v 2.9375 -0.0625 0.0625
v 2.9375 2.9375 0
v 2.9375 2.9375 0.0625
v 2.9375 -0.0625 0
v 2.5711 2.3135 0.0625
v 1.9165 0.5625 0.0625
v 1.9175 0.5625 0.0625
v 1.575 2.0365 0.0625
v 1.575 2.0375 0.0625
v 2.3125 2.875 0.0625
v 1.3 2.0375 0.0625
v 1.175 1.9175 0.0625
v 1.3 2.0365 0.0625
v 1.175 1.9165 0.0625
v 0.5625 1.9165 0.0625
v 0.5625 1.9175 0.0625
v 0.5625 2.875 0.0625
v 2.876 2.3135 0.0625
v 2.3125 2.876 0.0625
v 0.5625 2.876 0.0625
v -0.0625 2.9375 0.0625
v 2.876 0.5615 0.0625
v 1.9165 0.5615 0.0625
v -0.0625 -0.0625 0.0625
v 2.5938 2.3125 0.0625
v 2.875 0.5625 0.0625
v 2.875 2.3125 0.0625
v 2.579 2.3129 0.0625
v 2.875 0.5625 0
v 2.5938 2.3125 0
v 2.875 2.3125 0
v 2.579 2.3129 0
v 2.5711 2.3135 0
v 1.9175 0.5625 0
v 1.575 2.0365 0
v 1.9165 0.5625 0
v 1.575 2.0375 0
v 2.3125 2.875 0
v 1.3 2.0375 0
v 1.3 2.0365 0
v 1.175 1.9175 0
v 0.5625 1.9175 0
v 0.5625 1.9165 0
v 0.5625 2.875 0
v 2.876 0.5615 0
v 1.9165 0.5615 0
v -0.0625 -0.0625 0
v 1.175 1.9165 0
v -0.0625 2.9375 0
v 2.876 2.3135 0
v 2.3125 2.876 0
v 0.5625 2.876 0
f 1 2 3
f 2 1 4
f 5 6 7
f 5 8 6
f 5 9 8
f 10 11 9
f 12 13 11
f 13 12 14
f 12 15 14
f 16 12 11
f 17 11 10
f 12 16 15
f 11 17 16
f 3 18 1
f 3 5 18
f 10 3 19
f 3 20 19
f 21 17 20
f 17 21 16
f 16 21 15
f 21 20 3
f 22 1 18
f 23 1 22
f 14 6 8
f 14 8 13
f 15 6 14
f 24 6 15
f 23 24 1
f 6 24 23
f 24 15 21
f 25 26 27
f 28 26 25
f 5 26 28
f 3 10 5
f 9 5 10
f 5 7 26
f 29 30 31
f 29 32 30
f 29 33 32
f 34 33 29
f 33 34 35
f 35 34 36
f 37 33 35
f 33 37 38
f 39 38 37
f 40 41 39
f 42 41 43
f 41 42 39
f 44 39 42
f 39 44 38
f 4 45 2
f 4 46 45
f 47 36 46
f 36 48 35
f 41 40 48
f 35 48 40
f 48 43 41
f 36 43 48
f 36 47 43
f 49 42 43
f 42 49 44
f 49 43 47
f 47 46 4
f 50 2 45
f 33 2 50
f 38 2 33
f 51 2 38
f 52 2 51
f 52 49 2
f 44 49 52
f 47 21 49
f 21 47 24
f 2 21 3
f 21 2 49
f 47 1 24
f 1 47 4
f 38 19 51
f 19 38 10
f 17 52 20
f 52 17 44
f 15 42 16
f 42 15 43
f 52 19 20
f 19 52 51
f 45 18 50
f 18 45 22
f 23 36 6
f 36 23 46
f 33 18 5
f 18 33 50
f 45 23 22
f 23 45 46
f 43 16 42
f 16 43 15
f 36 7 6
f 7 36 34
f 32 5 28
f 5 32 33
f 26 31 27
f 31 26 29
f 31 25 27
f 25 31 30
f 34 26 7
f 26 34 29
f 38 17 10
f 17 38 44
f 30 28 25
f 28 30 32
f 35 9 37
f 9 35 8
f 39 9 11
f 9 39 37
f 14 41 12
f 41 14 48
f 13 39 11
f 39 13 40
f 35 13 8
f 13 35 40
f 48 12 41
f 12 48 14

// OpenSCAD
// file: modules.scad
// modules.scad — shared tile-building blocks: plate, rivets, edge ID marks,
// and the common plate/hole dimensional constants used by every tile.
// Units: inches
//
// Usage — must be `include`, not `use`, and the include line must come
// before any code in the caller that references plate_w/plate_d/plate_h/
// frame_w/hole_d/hole_r: a variable defined only inside an included file is
// invisible to code positioned before the include statement.
//   include <modules.scad>
//   plate(["red", undef, "blue", undef, undef, "green"]);
//
// plate(colors) is the main entry point: it builds the complete base tile in
// one call — the frame with edge ID marks, the darkgray plate, and the
// lightgray rivet ring (40 rivets, 10 per side, corners shared). colors is the
// same 6-slot frame_with_id() array described below.
//
// frame_with_id() colors are applied left-to-right (−x to +x), repeated
// identically on all four edges. Bottom and right edges read the array in
// reverse (slot 5-i) so the pattern stays consistent when the tile is flipped.
// Any position left as undef or omitted defaults to black. 6 regions span the
// straight run of each edge (corners always stay solid black). A thin black
// layer covers the marks on the top face; marks are visible from the edge.

plate_w = 2 + 7/8;
plate_d = 2 + 7/8;
plate_h = 1/16;
frame_w = 1/16;
hole_d  = 3/32;
hole_r  = hole_d / 2;

module rivet_holes() {
    spacing_x = plate_w / 10;
    spacing_y = plate_d / 10;
    inset_x   = spacing_x / 2;
    inset_y   = spacing_y / 2;
    for (i = [0:9]) translate([inset_x + i * spacing_x, inset_y,           -1]) cylinder(h = plate_h + 2, r = hole_r, $fn = 20);
    for (i = [0:9]) translate([inset_x + i * spacing_x, plate_d - inset_y, -1]) cylinder(h = plate_h + 2, r = hole_r, $fn = 20);
    for (i = [0:9]) translate([inset_x,           inset_y + i * spacing_y, -1]) cylinder(h = plate_h + 2, r = hole_r, $fn = 20);
    for (i = [0:9]) translate([plate_w - inset_x, inset_y + i * spacing_y, -1]) cylinder(h = plate_h + 2, r = hole_r, $fn = 20);
}

module rivets() {
    spacing_x = plate_w / 10;
    spacing_y = plate_d / 10;
    inset_x   = spacing_x / 2;
    inset_y   = spacing_y / 2;
    color("lightgray") {
        for (i = [0:9]) translate([inset_x + i * spacing_x, inset_y,           0]) cylinder(h = plate_h, r = hole_r, $fn = 20);
        for (i = [0:9]) translate([inset_x + i * spacing_x, plate_d - inset_y, 0]) cylinder(h = plate_h, r = hole_r, $fn = 20);
        for (i = [0:9]) translate([inset_x,           inset_y + i * spacing_y, 0]) cylinder(h = plate_h, r = hole_r, $fn = 20);
        for (i = [0:9]) translate([plate_w - inset_x, inset_y + i * spacing_y, 0]) cylinder(h = plate_h, r = hole_r, $fn = 20);
    }
}

module frame_with_id(colors = []) {
    id_cover = plate_h / 8;
    region_w = plate_w / 6;
    region_d = plate_d / 6;
    mark_h   = plate_h - id_cover;

    color("black")
    difference() {
        translate([-frame_w, -frame_w, 0])
            cube([plate_w + 2 * frame_w, plate_d + 2 * frame_w, plate_h]);
        translate([0, 0, -0.001])
            cube([plate_w, plate_d, plate_h + 0.002]);
        // top/bottom/left/right straight runs only — corners stay solid black
        translate([0, plate_d - 0.001, -0.001])
            cube([plate_w, frame_w + 0.002, plate_h + 0.002]);
        translate([0, -frame_w - 0.001, -0.001])
            cube([plate_w, frame_w + 0.002, plate_h + 0.002]);
        translate([-frame_w - 0.001, 0, -0.001])
            cube([frame_w + 0.002, plate_d, plate_h + 0.002]);
        translate([plate_w - 0.001, 0, -0.001])
            cube([frame_w + 0.002, plate_d, plate_h + 0.002]);
    }

    for (i = [0:5]) {
        c     = (colors[i] != undef) ? colors[i] : "black";

        // top edge
        color(c) translate([i * region_w, plate_d, 0]) cube([region_w, frame_w, mark_h]);
        color("black") translate([i * region_w, plate_d, mark_h]) cube([region_w, frame_w, id_cover]);

        // bottom edge (reversed)
        color(c) translate([(5-i) * region_w, -frame_w, 0]) cube([region_w, frame_w, mark_h]);
        color("black") translate([(5-i) * region_w, -frame_w, mark_h]) cube([region_w, frame_w, id_cover]);

        // left edge
        color(c) translate([-frame_w, i * region_d, 0]) cube([frame_w, region_d, mark_h]);
        color("black") translate([-frame_w, i * region_d, mark_h]) cube([frame_w, region_d, id_cover]);

        // right edge (reversed)
        color(c) translate([plate_w, (5-i) * region_d, 0]) cube([frame_w, region_d, mark_h]);
        color("black") translate([plate_w, (5-i) * region_d, mark_h]) cube([frame_w, region_d, id_cover]);
    }
}

module plate(colors = []) {
    frame_with_id(colors);
    union() {
        difference() {
            color("darkgray") cube([plate_w, plate_d, plate_h]);
            rivet_holes();
        }
        rivets();
    }
}
// main file
// element11.scad — right-turn belt tile
// Units: inches

straight   = false;
left_turn  = false;
right_turn = true;

include <modules.scad>

belt_w    = 1.75;
belt_half = belt_w / 2;

roller_count  = 13;
roller_h_size = 3/16;
roller_r      = roller_h_size / 2;
roller_inset  = plate_w / 20;
roller_x_lo   = 2 * roller_inset;
roller_x_hi   = plate_w - 2 * roller_inset;
roller_y_step = (plate_w - 2 * roller_inset) / 12;

b_L = plate_w / 2 - belt_half;
b_R = plate_w / 2 + belt_half;
nub = roller_x_hi - b_R;

arrow_w       = belt_w * 0.75;
arrow_shaft_w = arrow_w * 0.4;
arrow_shaft_h = 1.5;
arrow_head_h  = arrow_w / 2;
arrow_h       = arrow_shaft_h + arrow_head_h;
arrow_tip_y   = 3 * plate_d / 20 + 1/4 + 7 * plate_d / 10;
arrow_y       = arrow_tip_y - arrow_h;
arrow_outline = 1/16;
arrow_fill_w  = 2 * arrow_outline;

cx         = plate_w / 2;
r_curve    = 0.48;
y_merge    = arrow_y + arrow_shaft_h;
y_arc_ctr  = y_merge + 0.12;
y_entry    = y_arc_ctr + r_curve;
cx_l       = cx - r_curve;
cx_r       = cx + r_curve;
r_outer    = r_curve + belt_half;
h_straight = 0.49;

module belt_cutout() {
    // Straight vertical strip (top)
    translate([(plate_w - belt_w) / 2, plate_d/2 + r_curve - 0.001, -0.001])
        cube([belt_w, plate_d/2 - r_curve + 0.002, plate_h + 0.002]);
    // Horizontal entry from right
    translate([cx_r - 0.001, plate_d/2 - belt_half - 0.001, -0.001])
        cube([plate_w - cx_r + 0.002, belt_w + 0.002, plate_h + 0.002]);
    // Arc corner fill: lower-left quadrant at (cx_r, plate_d/2 + r_curve)
    translate([cx_r, plate_d/2 + r_curve, -0.001])
    linear_extrude(plate_h + 0.002)
    intersection() {
        circle(r = r_outer, $fn = 120);
        translate([-r_outer, -r_outer]) square([r_outer, r_outer]);
    }
    // Curved corner — bottom-left of the top-right uncovered square
    translate([b_R, plate_d/2 + belt_half, -0.001])
    linear_extrude(plate_h + 0.002)
    difference() {
        square([b_L/2, b_L/2]);
        translate([b_L/2, b_L/2])
            circle(r = b_L/2, $fn = 120);
    }
}

module roller_slots() {
    // a. Horizontal bars — top-section only, right-clipped; i=12 full-width
    for (i = [0:roller_count - 1]) {
        if (roller_inset + i * roller_y_step >= y_arc_ctr - roller_y_step) {
            translate([0, 0, -0.001])
            hull() {
                translate([roller_x_lo + roller_r,
                           roller_inset + i * roller_y_step, 0])
                    cylinder(h = plate_h + 0.002, r = roller_r, $fn = 20);
                translate([(i == roller_count - 1 ? roller_x_hi : b_R) - roller_r,
                           roller_inset + i * roller_y_step, 0])
                    cylinder(h = plate_h + 0.002, r = roller_r, $fn = 20);
            }
        }
    }
    // b. Vertical entry bars — right side; skip if rx < cx_r
    for (i = [0:roller_count - 1]) {
        if (roller_inset + i * roller_y_step >= cx_r) {
            y_hi = (i == roller_count - 1) ? plate_d - roller_x_lo : plate_d/2 + belt_half;
            translate([0, 0, -0.001])
            hull() {
                translate([roller_inset + i * roller_y_step, roller_x_lo + roller_r, 0])
                    cylinder(h = plate_h + 0.002, r = roller_r, $fn = 20);
                translate([roller_inset + i * roller_y_step, y_hi - roller_r, 0])
                    cylinder(h = plate_h + 0.002, r = roller_r, $fn = 20);
            }
        }
    }
    // c. Arc radial bars — 11 bars, center (cx_r, plate_d/2 + r_curve), 180°–270°
    r_outer_bars = r_outer + nub;
    for (k = [0:10]) {
        theta = 180 + 2.25 + k * (85.5 / 10);
        translate([cx_r, plate_d/2 + r_curve, 0])
        rotate([0, 0, theta])
        translate([0, 0, -0.001])
        hull() {
            translate([r_outer_bars - roller_r, 0, 0])
                cylinder(h = plate_h + 0.002, r = roller_r, $fn = 20);
            translate([r_outer_bars - roller_r - nub, 0, 0])
                cylinder(h = plate_h + 0.002, r = roller_r, $fn = 20);
        }
    }
    // d. Upper diagonal corner — upper-right of belt entry
    translate([b_R, plate_d/2 + belt_half, 0])
    rotate([0, 0, 45])
    translate([0, 0, -0.001])
    hull() {
        cylinder(h = plate_h + 0.002, r = roller_r, $fn = 20);
        translate([nub, 0, 0])
            cylinder(h = plate_h + 0.002, r = roller_r, $fn = 20);
    }
}

module rollers() {
    color("green")
    difference() {
        union() {
            // a. Horizontal bars
            for (i = [0:roller_count - 1]) {
                if (roller_inset + i * roller_y_step >= y_arc_ctr - roller_y_step) {
                    hull() {
                        translate([roller_x_lo + roller_r,
                                   roller_inset + i * roller_y_step, 0])
                            cylinder(h = plate_h, r = roller_r, $fn = 20);
                        translate([(i == roller_count - 1 ? roller_x_hi : b_R) - roller_r,
                                   roller_inset + i * roller_y_step, 0])
                            cylinder(h = plate_h, r = roller_r, $fn = 20);
                    }
                }
            }
            // b. Vertical entry bars
            for (i = [0:roller_count - 1]) {
                if (roller_inset + i * roller_y_step >= cx_r) {
                    y_hi = (i == roller_count - 1) ? plate_d - roller_x_lo : plate_d/2 + belt_half;
                    hull() {
                        translate([roller_inset + i * roller_y_step, roller_x_lo + roller_r, 0])
                            cylinder(h = plate_h, r = roller_r, $fn = 20);
                        translate([roller_inset + i * roller_y_step, y_hi - roller_r, 0])
                            cylinder(h = plate_h, r = roller_r, $fn = 20);
                    }
                }
            }
            // c. Arc radial bars
            r_outer_bars = r_outer + nub;
            for (k = [0:10]) {
                theta = 180 + 2.25 + k * (85.5 / 10);
                translate([cx_r, plate_d/2 + r_curve, 0])
                rotate([0, 0, theta])
                hull() {
                    translate([r_outer_bars - roller_r, 0, 0])
                        cylinder(h = plate_h, r = roller_r, $fn = 20);
                    translate([r_outer_bars - roller_r - nub, 0, 0])
                        cylinder(h = plate_h, r = roller_r, $fn = 20);
                }
            }
            // d. Upper diagonal corner — upper-right of belt entry
            translate([b_R, plate_d/2 + belt_half, 0])
            rotate([0, 0, 45])
            hull() {
                cylinder(h = plate_h, r = roller_r, $fn = 20);
                translate([nub, 0, 0])
                    cylinder(h = plate_h, r = roller_r, $fn = 20);
            }
        }
        belt_cutout();
    }
}

module arrow_2d() {
    polygon([
        [-arrow_shaft_w / 2, 0],
        [ arrow_shaft_w / 2, 0],
        [ arrow_shaft_w / 2, arrow_shaft_h],
        [ arrow_w / 2,       arrow_shaft_h],
        [ 0,                 arrow_h],
        [-arrow_w / 2,       arrow_shaft_h],
        [-arrow_shaft_w / 2, arrow_shaft_h]
    ]);
}


module arrow() {
    color("green") {
        // Vertical segment: cx, from arc center up to arrowhead base
        translate([cx - arrow_shaft_w/2, plate_d/2 + r_curve, 0])
        linear_extrude(plate_h)
        difference() {
            square([arrow_shaft_w, y_merge - (plate_d/2 + r_curve)]);
            translate([arrow_fill_w, 0])
                square([arrow_shaft_w - 2*arrow_fill_w, y_merge - (plate_d/2 + r_curve)]);
        }
        // Arc shaft: hollow annulus, lower-left quadrant (180°–270°)
        translate([cx_r, plate_d/2 + r_curve, 0])
        linear_extrude(plate_h)
        intersection() {
            difference() {
                difference() {
                    circle(r = r_curve + arrow_shaft_w/2, $fn = 120);
                    circle(r = r_curve - arrow_shaft_w/2, $fn = 120);
                }
                offset(delta = -arrow_fill_w)
                difference() {
                    circle(r = r_curve + arrow_shaft_w/2, $fn = 120);
                    circle(r = r_curve - arrow_shaft_w/2, $fn = 120);
                }
            }
            translate([-(r_curve + arrow_shaft_w/2), -(r_curve + arrow_shaft_w/2)])
                square([r_curve + arrow_shaft_w/2, r_curve + arrow_shaft_w/2]);
        }
        // Horizontal segment: from arc 270° endpoint at (cx_r, plate_d/2) going right
        translate([cx_r, plate_d/2 - arrow_shaft_w/2, 0])
        linear_extrude(plate_h)
        difference() {
            square([h_straight, arrow_shaft_w]);
            translate([0, arrow_fill_w])
                square([h_straight, arrow_shaft_w - 2*arrow_fill_w]);
        }
        // End cap
        translate([cx_r + h_straight - arrow_fill_w, plate_d/2 - arrow_shaft_w/2, 0])
            cube([arrow_fill_w, arrow_shaft_w, plate_h]);
        // Arrowhead — clipped from full arrow_2d so base is open to shaft
        translate([cx, arrow_y, 0])
        linear_extrude(plate_h)
        intersection() {
            difference() {
                arrow_2d();
                offset(delta = -arrow_fill_w) arrow_2d();
            }
            translate([-arrow_w / 2, arrow_shaft_h])
                square([arrow_w, arrow_head_h]);
        }
    }
}

module belt() {
    color("black")
    difference() {
        union() {
            translate([cx_r, plate_d/2 - belt_half, 0])
                cube([plate_w - cx_r, belt_w, plate_h]);
            translate([cx_r, plate_d/2 + r_curve, 0])
            linear_extrude(plate_h)
            intersection() {
                circle(r = r_outer, $fn = 120);
                translate([-r_outer, -r_outer]) square([r_outer, r_outer]);
            }
            translate([b_L, plate_d/2 + r_curve, 0])
                cube([belt_w, plate_d/2 - r_curve, plate_h]);
            // Curved corner — bottom-left of the top-right uncovered square
            translate([b_R, plate_d/2 + belt_half, 0])
            linear_extrude(plate_h)
            difference() {
                square([b_L/2, b_L/2]);
                translate([b_L/2, b_L/2])
                    circle(r = b_L/2, $fn = 120);
            }
        }
        // Vertical segment cutout
        translate([cx - arrow_shaft_w/2, plate_d/2 + r_curve - 0.001, -0.001])
        linear_extrude(plate_h + 0.002)
        difference() {
            square([arrow_shaft_w, y_merge - (plate_d/2 + r_curve) + 0.001]);
            translate([arrow_fill_w, 0])
                square([arrow_shaft_w - 2*arrow_fill_w, y_merge - (plate_d/2 + r_curve)]);
        }
        // Arc shaft cutout
        translate([cx_r, plate_d/2 + r_curve, -0.001])
        linear_extrude(plate_h + 0.002)
        intersection() {
            difference() {
                difference() {
                    circle(r = r_curve + arrow_shaft_w/2, $fn = 120);
                    circle(r = r_curve - arrow_shaft_w/2, $fn = 120);
                }
                offset(delta = -arrow_fill_w)
                difference() {
                    circle(r = r_curve + arrow_shaft_w/2, $fn = 120);
                    circle(r = r_curve - arrow_shaft_w/2, $fn = 120);
                }
            }
            translate([-(r_curve + arrow_shaft_w/2), -(r_curve + arrow_shaft_w/2)])
                square([r_curve + arrow_shaft_w/2, r_curve + arrow_shaft_w/2]);
        }
        // Horizontal segment cutout
        translate([cx_r, plate_d/2 - arrow_shaft_w/2, -0.001])
        linear_extrude(plate_h + 0.002)
        difference() {
            square([h_straight, arrow_shaft_w]);
            translate([0, arrow_fill_w])
                square([h_straight, arrow_shaft_w - 2*arrow_fill_w]);
        }
        // End cap cutout
        translate([cx_r + h_straight - arrow_fill_w, plate_d/2 - arrow_shaft_w/2, -0.001])
            cube([arrow_fill_w, arrow_shaft_w, plate_h + 0.002]);
        // Arrowhead cutout — clipped from full arrow_2d so base is open to shaft
        translate([cx, arrow_y, -0.001])
        linear_extrude(plate_h + 0.002)
        intersection() {
            difference() {
                arrow_2d();
                offset(delta = -arrow_fill_w) arrow_2d();
            }
            translate([-arrow_w / 2, arrow_shaft_h])
                square([arrow_w, arrow_head_h]);
        }
    }
}

difference() {
    plate([undef, undef, "green", "green", "green", "green"]);
    roller_slots();
    belt_cutout();
}
rollers();
belt();
arrow();
